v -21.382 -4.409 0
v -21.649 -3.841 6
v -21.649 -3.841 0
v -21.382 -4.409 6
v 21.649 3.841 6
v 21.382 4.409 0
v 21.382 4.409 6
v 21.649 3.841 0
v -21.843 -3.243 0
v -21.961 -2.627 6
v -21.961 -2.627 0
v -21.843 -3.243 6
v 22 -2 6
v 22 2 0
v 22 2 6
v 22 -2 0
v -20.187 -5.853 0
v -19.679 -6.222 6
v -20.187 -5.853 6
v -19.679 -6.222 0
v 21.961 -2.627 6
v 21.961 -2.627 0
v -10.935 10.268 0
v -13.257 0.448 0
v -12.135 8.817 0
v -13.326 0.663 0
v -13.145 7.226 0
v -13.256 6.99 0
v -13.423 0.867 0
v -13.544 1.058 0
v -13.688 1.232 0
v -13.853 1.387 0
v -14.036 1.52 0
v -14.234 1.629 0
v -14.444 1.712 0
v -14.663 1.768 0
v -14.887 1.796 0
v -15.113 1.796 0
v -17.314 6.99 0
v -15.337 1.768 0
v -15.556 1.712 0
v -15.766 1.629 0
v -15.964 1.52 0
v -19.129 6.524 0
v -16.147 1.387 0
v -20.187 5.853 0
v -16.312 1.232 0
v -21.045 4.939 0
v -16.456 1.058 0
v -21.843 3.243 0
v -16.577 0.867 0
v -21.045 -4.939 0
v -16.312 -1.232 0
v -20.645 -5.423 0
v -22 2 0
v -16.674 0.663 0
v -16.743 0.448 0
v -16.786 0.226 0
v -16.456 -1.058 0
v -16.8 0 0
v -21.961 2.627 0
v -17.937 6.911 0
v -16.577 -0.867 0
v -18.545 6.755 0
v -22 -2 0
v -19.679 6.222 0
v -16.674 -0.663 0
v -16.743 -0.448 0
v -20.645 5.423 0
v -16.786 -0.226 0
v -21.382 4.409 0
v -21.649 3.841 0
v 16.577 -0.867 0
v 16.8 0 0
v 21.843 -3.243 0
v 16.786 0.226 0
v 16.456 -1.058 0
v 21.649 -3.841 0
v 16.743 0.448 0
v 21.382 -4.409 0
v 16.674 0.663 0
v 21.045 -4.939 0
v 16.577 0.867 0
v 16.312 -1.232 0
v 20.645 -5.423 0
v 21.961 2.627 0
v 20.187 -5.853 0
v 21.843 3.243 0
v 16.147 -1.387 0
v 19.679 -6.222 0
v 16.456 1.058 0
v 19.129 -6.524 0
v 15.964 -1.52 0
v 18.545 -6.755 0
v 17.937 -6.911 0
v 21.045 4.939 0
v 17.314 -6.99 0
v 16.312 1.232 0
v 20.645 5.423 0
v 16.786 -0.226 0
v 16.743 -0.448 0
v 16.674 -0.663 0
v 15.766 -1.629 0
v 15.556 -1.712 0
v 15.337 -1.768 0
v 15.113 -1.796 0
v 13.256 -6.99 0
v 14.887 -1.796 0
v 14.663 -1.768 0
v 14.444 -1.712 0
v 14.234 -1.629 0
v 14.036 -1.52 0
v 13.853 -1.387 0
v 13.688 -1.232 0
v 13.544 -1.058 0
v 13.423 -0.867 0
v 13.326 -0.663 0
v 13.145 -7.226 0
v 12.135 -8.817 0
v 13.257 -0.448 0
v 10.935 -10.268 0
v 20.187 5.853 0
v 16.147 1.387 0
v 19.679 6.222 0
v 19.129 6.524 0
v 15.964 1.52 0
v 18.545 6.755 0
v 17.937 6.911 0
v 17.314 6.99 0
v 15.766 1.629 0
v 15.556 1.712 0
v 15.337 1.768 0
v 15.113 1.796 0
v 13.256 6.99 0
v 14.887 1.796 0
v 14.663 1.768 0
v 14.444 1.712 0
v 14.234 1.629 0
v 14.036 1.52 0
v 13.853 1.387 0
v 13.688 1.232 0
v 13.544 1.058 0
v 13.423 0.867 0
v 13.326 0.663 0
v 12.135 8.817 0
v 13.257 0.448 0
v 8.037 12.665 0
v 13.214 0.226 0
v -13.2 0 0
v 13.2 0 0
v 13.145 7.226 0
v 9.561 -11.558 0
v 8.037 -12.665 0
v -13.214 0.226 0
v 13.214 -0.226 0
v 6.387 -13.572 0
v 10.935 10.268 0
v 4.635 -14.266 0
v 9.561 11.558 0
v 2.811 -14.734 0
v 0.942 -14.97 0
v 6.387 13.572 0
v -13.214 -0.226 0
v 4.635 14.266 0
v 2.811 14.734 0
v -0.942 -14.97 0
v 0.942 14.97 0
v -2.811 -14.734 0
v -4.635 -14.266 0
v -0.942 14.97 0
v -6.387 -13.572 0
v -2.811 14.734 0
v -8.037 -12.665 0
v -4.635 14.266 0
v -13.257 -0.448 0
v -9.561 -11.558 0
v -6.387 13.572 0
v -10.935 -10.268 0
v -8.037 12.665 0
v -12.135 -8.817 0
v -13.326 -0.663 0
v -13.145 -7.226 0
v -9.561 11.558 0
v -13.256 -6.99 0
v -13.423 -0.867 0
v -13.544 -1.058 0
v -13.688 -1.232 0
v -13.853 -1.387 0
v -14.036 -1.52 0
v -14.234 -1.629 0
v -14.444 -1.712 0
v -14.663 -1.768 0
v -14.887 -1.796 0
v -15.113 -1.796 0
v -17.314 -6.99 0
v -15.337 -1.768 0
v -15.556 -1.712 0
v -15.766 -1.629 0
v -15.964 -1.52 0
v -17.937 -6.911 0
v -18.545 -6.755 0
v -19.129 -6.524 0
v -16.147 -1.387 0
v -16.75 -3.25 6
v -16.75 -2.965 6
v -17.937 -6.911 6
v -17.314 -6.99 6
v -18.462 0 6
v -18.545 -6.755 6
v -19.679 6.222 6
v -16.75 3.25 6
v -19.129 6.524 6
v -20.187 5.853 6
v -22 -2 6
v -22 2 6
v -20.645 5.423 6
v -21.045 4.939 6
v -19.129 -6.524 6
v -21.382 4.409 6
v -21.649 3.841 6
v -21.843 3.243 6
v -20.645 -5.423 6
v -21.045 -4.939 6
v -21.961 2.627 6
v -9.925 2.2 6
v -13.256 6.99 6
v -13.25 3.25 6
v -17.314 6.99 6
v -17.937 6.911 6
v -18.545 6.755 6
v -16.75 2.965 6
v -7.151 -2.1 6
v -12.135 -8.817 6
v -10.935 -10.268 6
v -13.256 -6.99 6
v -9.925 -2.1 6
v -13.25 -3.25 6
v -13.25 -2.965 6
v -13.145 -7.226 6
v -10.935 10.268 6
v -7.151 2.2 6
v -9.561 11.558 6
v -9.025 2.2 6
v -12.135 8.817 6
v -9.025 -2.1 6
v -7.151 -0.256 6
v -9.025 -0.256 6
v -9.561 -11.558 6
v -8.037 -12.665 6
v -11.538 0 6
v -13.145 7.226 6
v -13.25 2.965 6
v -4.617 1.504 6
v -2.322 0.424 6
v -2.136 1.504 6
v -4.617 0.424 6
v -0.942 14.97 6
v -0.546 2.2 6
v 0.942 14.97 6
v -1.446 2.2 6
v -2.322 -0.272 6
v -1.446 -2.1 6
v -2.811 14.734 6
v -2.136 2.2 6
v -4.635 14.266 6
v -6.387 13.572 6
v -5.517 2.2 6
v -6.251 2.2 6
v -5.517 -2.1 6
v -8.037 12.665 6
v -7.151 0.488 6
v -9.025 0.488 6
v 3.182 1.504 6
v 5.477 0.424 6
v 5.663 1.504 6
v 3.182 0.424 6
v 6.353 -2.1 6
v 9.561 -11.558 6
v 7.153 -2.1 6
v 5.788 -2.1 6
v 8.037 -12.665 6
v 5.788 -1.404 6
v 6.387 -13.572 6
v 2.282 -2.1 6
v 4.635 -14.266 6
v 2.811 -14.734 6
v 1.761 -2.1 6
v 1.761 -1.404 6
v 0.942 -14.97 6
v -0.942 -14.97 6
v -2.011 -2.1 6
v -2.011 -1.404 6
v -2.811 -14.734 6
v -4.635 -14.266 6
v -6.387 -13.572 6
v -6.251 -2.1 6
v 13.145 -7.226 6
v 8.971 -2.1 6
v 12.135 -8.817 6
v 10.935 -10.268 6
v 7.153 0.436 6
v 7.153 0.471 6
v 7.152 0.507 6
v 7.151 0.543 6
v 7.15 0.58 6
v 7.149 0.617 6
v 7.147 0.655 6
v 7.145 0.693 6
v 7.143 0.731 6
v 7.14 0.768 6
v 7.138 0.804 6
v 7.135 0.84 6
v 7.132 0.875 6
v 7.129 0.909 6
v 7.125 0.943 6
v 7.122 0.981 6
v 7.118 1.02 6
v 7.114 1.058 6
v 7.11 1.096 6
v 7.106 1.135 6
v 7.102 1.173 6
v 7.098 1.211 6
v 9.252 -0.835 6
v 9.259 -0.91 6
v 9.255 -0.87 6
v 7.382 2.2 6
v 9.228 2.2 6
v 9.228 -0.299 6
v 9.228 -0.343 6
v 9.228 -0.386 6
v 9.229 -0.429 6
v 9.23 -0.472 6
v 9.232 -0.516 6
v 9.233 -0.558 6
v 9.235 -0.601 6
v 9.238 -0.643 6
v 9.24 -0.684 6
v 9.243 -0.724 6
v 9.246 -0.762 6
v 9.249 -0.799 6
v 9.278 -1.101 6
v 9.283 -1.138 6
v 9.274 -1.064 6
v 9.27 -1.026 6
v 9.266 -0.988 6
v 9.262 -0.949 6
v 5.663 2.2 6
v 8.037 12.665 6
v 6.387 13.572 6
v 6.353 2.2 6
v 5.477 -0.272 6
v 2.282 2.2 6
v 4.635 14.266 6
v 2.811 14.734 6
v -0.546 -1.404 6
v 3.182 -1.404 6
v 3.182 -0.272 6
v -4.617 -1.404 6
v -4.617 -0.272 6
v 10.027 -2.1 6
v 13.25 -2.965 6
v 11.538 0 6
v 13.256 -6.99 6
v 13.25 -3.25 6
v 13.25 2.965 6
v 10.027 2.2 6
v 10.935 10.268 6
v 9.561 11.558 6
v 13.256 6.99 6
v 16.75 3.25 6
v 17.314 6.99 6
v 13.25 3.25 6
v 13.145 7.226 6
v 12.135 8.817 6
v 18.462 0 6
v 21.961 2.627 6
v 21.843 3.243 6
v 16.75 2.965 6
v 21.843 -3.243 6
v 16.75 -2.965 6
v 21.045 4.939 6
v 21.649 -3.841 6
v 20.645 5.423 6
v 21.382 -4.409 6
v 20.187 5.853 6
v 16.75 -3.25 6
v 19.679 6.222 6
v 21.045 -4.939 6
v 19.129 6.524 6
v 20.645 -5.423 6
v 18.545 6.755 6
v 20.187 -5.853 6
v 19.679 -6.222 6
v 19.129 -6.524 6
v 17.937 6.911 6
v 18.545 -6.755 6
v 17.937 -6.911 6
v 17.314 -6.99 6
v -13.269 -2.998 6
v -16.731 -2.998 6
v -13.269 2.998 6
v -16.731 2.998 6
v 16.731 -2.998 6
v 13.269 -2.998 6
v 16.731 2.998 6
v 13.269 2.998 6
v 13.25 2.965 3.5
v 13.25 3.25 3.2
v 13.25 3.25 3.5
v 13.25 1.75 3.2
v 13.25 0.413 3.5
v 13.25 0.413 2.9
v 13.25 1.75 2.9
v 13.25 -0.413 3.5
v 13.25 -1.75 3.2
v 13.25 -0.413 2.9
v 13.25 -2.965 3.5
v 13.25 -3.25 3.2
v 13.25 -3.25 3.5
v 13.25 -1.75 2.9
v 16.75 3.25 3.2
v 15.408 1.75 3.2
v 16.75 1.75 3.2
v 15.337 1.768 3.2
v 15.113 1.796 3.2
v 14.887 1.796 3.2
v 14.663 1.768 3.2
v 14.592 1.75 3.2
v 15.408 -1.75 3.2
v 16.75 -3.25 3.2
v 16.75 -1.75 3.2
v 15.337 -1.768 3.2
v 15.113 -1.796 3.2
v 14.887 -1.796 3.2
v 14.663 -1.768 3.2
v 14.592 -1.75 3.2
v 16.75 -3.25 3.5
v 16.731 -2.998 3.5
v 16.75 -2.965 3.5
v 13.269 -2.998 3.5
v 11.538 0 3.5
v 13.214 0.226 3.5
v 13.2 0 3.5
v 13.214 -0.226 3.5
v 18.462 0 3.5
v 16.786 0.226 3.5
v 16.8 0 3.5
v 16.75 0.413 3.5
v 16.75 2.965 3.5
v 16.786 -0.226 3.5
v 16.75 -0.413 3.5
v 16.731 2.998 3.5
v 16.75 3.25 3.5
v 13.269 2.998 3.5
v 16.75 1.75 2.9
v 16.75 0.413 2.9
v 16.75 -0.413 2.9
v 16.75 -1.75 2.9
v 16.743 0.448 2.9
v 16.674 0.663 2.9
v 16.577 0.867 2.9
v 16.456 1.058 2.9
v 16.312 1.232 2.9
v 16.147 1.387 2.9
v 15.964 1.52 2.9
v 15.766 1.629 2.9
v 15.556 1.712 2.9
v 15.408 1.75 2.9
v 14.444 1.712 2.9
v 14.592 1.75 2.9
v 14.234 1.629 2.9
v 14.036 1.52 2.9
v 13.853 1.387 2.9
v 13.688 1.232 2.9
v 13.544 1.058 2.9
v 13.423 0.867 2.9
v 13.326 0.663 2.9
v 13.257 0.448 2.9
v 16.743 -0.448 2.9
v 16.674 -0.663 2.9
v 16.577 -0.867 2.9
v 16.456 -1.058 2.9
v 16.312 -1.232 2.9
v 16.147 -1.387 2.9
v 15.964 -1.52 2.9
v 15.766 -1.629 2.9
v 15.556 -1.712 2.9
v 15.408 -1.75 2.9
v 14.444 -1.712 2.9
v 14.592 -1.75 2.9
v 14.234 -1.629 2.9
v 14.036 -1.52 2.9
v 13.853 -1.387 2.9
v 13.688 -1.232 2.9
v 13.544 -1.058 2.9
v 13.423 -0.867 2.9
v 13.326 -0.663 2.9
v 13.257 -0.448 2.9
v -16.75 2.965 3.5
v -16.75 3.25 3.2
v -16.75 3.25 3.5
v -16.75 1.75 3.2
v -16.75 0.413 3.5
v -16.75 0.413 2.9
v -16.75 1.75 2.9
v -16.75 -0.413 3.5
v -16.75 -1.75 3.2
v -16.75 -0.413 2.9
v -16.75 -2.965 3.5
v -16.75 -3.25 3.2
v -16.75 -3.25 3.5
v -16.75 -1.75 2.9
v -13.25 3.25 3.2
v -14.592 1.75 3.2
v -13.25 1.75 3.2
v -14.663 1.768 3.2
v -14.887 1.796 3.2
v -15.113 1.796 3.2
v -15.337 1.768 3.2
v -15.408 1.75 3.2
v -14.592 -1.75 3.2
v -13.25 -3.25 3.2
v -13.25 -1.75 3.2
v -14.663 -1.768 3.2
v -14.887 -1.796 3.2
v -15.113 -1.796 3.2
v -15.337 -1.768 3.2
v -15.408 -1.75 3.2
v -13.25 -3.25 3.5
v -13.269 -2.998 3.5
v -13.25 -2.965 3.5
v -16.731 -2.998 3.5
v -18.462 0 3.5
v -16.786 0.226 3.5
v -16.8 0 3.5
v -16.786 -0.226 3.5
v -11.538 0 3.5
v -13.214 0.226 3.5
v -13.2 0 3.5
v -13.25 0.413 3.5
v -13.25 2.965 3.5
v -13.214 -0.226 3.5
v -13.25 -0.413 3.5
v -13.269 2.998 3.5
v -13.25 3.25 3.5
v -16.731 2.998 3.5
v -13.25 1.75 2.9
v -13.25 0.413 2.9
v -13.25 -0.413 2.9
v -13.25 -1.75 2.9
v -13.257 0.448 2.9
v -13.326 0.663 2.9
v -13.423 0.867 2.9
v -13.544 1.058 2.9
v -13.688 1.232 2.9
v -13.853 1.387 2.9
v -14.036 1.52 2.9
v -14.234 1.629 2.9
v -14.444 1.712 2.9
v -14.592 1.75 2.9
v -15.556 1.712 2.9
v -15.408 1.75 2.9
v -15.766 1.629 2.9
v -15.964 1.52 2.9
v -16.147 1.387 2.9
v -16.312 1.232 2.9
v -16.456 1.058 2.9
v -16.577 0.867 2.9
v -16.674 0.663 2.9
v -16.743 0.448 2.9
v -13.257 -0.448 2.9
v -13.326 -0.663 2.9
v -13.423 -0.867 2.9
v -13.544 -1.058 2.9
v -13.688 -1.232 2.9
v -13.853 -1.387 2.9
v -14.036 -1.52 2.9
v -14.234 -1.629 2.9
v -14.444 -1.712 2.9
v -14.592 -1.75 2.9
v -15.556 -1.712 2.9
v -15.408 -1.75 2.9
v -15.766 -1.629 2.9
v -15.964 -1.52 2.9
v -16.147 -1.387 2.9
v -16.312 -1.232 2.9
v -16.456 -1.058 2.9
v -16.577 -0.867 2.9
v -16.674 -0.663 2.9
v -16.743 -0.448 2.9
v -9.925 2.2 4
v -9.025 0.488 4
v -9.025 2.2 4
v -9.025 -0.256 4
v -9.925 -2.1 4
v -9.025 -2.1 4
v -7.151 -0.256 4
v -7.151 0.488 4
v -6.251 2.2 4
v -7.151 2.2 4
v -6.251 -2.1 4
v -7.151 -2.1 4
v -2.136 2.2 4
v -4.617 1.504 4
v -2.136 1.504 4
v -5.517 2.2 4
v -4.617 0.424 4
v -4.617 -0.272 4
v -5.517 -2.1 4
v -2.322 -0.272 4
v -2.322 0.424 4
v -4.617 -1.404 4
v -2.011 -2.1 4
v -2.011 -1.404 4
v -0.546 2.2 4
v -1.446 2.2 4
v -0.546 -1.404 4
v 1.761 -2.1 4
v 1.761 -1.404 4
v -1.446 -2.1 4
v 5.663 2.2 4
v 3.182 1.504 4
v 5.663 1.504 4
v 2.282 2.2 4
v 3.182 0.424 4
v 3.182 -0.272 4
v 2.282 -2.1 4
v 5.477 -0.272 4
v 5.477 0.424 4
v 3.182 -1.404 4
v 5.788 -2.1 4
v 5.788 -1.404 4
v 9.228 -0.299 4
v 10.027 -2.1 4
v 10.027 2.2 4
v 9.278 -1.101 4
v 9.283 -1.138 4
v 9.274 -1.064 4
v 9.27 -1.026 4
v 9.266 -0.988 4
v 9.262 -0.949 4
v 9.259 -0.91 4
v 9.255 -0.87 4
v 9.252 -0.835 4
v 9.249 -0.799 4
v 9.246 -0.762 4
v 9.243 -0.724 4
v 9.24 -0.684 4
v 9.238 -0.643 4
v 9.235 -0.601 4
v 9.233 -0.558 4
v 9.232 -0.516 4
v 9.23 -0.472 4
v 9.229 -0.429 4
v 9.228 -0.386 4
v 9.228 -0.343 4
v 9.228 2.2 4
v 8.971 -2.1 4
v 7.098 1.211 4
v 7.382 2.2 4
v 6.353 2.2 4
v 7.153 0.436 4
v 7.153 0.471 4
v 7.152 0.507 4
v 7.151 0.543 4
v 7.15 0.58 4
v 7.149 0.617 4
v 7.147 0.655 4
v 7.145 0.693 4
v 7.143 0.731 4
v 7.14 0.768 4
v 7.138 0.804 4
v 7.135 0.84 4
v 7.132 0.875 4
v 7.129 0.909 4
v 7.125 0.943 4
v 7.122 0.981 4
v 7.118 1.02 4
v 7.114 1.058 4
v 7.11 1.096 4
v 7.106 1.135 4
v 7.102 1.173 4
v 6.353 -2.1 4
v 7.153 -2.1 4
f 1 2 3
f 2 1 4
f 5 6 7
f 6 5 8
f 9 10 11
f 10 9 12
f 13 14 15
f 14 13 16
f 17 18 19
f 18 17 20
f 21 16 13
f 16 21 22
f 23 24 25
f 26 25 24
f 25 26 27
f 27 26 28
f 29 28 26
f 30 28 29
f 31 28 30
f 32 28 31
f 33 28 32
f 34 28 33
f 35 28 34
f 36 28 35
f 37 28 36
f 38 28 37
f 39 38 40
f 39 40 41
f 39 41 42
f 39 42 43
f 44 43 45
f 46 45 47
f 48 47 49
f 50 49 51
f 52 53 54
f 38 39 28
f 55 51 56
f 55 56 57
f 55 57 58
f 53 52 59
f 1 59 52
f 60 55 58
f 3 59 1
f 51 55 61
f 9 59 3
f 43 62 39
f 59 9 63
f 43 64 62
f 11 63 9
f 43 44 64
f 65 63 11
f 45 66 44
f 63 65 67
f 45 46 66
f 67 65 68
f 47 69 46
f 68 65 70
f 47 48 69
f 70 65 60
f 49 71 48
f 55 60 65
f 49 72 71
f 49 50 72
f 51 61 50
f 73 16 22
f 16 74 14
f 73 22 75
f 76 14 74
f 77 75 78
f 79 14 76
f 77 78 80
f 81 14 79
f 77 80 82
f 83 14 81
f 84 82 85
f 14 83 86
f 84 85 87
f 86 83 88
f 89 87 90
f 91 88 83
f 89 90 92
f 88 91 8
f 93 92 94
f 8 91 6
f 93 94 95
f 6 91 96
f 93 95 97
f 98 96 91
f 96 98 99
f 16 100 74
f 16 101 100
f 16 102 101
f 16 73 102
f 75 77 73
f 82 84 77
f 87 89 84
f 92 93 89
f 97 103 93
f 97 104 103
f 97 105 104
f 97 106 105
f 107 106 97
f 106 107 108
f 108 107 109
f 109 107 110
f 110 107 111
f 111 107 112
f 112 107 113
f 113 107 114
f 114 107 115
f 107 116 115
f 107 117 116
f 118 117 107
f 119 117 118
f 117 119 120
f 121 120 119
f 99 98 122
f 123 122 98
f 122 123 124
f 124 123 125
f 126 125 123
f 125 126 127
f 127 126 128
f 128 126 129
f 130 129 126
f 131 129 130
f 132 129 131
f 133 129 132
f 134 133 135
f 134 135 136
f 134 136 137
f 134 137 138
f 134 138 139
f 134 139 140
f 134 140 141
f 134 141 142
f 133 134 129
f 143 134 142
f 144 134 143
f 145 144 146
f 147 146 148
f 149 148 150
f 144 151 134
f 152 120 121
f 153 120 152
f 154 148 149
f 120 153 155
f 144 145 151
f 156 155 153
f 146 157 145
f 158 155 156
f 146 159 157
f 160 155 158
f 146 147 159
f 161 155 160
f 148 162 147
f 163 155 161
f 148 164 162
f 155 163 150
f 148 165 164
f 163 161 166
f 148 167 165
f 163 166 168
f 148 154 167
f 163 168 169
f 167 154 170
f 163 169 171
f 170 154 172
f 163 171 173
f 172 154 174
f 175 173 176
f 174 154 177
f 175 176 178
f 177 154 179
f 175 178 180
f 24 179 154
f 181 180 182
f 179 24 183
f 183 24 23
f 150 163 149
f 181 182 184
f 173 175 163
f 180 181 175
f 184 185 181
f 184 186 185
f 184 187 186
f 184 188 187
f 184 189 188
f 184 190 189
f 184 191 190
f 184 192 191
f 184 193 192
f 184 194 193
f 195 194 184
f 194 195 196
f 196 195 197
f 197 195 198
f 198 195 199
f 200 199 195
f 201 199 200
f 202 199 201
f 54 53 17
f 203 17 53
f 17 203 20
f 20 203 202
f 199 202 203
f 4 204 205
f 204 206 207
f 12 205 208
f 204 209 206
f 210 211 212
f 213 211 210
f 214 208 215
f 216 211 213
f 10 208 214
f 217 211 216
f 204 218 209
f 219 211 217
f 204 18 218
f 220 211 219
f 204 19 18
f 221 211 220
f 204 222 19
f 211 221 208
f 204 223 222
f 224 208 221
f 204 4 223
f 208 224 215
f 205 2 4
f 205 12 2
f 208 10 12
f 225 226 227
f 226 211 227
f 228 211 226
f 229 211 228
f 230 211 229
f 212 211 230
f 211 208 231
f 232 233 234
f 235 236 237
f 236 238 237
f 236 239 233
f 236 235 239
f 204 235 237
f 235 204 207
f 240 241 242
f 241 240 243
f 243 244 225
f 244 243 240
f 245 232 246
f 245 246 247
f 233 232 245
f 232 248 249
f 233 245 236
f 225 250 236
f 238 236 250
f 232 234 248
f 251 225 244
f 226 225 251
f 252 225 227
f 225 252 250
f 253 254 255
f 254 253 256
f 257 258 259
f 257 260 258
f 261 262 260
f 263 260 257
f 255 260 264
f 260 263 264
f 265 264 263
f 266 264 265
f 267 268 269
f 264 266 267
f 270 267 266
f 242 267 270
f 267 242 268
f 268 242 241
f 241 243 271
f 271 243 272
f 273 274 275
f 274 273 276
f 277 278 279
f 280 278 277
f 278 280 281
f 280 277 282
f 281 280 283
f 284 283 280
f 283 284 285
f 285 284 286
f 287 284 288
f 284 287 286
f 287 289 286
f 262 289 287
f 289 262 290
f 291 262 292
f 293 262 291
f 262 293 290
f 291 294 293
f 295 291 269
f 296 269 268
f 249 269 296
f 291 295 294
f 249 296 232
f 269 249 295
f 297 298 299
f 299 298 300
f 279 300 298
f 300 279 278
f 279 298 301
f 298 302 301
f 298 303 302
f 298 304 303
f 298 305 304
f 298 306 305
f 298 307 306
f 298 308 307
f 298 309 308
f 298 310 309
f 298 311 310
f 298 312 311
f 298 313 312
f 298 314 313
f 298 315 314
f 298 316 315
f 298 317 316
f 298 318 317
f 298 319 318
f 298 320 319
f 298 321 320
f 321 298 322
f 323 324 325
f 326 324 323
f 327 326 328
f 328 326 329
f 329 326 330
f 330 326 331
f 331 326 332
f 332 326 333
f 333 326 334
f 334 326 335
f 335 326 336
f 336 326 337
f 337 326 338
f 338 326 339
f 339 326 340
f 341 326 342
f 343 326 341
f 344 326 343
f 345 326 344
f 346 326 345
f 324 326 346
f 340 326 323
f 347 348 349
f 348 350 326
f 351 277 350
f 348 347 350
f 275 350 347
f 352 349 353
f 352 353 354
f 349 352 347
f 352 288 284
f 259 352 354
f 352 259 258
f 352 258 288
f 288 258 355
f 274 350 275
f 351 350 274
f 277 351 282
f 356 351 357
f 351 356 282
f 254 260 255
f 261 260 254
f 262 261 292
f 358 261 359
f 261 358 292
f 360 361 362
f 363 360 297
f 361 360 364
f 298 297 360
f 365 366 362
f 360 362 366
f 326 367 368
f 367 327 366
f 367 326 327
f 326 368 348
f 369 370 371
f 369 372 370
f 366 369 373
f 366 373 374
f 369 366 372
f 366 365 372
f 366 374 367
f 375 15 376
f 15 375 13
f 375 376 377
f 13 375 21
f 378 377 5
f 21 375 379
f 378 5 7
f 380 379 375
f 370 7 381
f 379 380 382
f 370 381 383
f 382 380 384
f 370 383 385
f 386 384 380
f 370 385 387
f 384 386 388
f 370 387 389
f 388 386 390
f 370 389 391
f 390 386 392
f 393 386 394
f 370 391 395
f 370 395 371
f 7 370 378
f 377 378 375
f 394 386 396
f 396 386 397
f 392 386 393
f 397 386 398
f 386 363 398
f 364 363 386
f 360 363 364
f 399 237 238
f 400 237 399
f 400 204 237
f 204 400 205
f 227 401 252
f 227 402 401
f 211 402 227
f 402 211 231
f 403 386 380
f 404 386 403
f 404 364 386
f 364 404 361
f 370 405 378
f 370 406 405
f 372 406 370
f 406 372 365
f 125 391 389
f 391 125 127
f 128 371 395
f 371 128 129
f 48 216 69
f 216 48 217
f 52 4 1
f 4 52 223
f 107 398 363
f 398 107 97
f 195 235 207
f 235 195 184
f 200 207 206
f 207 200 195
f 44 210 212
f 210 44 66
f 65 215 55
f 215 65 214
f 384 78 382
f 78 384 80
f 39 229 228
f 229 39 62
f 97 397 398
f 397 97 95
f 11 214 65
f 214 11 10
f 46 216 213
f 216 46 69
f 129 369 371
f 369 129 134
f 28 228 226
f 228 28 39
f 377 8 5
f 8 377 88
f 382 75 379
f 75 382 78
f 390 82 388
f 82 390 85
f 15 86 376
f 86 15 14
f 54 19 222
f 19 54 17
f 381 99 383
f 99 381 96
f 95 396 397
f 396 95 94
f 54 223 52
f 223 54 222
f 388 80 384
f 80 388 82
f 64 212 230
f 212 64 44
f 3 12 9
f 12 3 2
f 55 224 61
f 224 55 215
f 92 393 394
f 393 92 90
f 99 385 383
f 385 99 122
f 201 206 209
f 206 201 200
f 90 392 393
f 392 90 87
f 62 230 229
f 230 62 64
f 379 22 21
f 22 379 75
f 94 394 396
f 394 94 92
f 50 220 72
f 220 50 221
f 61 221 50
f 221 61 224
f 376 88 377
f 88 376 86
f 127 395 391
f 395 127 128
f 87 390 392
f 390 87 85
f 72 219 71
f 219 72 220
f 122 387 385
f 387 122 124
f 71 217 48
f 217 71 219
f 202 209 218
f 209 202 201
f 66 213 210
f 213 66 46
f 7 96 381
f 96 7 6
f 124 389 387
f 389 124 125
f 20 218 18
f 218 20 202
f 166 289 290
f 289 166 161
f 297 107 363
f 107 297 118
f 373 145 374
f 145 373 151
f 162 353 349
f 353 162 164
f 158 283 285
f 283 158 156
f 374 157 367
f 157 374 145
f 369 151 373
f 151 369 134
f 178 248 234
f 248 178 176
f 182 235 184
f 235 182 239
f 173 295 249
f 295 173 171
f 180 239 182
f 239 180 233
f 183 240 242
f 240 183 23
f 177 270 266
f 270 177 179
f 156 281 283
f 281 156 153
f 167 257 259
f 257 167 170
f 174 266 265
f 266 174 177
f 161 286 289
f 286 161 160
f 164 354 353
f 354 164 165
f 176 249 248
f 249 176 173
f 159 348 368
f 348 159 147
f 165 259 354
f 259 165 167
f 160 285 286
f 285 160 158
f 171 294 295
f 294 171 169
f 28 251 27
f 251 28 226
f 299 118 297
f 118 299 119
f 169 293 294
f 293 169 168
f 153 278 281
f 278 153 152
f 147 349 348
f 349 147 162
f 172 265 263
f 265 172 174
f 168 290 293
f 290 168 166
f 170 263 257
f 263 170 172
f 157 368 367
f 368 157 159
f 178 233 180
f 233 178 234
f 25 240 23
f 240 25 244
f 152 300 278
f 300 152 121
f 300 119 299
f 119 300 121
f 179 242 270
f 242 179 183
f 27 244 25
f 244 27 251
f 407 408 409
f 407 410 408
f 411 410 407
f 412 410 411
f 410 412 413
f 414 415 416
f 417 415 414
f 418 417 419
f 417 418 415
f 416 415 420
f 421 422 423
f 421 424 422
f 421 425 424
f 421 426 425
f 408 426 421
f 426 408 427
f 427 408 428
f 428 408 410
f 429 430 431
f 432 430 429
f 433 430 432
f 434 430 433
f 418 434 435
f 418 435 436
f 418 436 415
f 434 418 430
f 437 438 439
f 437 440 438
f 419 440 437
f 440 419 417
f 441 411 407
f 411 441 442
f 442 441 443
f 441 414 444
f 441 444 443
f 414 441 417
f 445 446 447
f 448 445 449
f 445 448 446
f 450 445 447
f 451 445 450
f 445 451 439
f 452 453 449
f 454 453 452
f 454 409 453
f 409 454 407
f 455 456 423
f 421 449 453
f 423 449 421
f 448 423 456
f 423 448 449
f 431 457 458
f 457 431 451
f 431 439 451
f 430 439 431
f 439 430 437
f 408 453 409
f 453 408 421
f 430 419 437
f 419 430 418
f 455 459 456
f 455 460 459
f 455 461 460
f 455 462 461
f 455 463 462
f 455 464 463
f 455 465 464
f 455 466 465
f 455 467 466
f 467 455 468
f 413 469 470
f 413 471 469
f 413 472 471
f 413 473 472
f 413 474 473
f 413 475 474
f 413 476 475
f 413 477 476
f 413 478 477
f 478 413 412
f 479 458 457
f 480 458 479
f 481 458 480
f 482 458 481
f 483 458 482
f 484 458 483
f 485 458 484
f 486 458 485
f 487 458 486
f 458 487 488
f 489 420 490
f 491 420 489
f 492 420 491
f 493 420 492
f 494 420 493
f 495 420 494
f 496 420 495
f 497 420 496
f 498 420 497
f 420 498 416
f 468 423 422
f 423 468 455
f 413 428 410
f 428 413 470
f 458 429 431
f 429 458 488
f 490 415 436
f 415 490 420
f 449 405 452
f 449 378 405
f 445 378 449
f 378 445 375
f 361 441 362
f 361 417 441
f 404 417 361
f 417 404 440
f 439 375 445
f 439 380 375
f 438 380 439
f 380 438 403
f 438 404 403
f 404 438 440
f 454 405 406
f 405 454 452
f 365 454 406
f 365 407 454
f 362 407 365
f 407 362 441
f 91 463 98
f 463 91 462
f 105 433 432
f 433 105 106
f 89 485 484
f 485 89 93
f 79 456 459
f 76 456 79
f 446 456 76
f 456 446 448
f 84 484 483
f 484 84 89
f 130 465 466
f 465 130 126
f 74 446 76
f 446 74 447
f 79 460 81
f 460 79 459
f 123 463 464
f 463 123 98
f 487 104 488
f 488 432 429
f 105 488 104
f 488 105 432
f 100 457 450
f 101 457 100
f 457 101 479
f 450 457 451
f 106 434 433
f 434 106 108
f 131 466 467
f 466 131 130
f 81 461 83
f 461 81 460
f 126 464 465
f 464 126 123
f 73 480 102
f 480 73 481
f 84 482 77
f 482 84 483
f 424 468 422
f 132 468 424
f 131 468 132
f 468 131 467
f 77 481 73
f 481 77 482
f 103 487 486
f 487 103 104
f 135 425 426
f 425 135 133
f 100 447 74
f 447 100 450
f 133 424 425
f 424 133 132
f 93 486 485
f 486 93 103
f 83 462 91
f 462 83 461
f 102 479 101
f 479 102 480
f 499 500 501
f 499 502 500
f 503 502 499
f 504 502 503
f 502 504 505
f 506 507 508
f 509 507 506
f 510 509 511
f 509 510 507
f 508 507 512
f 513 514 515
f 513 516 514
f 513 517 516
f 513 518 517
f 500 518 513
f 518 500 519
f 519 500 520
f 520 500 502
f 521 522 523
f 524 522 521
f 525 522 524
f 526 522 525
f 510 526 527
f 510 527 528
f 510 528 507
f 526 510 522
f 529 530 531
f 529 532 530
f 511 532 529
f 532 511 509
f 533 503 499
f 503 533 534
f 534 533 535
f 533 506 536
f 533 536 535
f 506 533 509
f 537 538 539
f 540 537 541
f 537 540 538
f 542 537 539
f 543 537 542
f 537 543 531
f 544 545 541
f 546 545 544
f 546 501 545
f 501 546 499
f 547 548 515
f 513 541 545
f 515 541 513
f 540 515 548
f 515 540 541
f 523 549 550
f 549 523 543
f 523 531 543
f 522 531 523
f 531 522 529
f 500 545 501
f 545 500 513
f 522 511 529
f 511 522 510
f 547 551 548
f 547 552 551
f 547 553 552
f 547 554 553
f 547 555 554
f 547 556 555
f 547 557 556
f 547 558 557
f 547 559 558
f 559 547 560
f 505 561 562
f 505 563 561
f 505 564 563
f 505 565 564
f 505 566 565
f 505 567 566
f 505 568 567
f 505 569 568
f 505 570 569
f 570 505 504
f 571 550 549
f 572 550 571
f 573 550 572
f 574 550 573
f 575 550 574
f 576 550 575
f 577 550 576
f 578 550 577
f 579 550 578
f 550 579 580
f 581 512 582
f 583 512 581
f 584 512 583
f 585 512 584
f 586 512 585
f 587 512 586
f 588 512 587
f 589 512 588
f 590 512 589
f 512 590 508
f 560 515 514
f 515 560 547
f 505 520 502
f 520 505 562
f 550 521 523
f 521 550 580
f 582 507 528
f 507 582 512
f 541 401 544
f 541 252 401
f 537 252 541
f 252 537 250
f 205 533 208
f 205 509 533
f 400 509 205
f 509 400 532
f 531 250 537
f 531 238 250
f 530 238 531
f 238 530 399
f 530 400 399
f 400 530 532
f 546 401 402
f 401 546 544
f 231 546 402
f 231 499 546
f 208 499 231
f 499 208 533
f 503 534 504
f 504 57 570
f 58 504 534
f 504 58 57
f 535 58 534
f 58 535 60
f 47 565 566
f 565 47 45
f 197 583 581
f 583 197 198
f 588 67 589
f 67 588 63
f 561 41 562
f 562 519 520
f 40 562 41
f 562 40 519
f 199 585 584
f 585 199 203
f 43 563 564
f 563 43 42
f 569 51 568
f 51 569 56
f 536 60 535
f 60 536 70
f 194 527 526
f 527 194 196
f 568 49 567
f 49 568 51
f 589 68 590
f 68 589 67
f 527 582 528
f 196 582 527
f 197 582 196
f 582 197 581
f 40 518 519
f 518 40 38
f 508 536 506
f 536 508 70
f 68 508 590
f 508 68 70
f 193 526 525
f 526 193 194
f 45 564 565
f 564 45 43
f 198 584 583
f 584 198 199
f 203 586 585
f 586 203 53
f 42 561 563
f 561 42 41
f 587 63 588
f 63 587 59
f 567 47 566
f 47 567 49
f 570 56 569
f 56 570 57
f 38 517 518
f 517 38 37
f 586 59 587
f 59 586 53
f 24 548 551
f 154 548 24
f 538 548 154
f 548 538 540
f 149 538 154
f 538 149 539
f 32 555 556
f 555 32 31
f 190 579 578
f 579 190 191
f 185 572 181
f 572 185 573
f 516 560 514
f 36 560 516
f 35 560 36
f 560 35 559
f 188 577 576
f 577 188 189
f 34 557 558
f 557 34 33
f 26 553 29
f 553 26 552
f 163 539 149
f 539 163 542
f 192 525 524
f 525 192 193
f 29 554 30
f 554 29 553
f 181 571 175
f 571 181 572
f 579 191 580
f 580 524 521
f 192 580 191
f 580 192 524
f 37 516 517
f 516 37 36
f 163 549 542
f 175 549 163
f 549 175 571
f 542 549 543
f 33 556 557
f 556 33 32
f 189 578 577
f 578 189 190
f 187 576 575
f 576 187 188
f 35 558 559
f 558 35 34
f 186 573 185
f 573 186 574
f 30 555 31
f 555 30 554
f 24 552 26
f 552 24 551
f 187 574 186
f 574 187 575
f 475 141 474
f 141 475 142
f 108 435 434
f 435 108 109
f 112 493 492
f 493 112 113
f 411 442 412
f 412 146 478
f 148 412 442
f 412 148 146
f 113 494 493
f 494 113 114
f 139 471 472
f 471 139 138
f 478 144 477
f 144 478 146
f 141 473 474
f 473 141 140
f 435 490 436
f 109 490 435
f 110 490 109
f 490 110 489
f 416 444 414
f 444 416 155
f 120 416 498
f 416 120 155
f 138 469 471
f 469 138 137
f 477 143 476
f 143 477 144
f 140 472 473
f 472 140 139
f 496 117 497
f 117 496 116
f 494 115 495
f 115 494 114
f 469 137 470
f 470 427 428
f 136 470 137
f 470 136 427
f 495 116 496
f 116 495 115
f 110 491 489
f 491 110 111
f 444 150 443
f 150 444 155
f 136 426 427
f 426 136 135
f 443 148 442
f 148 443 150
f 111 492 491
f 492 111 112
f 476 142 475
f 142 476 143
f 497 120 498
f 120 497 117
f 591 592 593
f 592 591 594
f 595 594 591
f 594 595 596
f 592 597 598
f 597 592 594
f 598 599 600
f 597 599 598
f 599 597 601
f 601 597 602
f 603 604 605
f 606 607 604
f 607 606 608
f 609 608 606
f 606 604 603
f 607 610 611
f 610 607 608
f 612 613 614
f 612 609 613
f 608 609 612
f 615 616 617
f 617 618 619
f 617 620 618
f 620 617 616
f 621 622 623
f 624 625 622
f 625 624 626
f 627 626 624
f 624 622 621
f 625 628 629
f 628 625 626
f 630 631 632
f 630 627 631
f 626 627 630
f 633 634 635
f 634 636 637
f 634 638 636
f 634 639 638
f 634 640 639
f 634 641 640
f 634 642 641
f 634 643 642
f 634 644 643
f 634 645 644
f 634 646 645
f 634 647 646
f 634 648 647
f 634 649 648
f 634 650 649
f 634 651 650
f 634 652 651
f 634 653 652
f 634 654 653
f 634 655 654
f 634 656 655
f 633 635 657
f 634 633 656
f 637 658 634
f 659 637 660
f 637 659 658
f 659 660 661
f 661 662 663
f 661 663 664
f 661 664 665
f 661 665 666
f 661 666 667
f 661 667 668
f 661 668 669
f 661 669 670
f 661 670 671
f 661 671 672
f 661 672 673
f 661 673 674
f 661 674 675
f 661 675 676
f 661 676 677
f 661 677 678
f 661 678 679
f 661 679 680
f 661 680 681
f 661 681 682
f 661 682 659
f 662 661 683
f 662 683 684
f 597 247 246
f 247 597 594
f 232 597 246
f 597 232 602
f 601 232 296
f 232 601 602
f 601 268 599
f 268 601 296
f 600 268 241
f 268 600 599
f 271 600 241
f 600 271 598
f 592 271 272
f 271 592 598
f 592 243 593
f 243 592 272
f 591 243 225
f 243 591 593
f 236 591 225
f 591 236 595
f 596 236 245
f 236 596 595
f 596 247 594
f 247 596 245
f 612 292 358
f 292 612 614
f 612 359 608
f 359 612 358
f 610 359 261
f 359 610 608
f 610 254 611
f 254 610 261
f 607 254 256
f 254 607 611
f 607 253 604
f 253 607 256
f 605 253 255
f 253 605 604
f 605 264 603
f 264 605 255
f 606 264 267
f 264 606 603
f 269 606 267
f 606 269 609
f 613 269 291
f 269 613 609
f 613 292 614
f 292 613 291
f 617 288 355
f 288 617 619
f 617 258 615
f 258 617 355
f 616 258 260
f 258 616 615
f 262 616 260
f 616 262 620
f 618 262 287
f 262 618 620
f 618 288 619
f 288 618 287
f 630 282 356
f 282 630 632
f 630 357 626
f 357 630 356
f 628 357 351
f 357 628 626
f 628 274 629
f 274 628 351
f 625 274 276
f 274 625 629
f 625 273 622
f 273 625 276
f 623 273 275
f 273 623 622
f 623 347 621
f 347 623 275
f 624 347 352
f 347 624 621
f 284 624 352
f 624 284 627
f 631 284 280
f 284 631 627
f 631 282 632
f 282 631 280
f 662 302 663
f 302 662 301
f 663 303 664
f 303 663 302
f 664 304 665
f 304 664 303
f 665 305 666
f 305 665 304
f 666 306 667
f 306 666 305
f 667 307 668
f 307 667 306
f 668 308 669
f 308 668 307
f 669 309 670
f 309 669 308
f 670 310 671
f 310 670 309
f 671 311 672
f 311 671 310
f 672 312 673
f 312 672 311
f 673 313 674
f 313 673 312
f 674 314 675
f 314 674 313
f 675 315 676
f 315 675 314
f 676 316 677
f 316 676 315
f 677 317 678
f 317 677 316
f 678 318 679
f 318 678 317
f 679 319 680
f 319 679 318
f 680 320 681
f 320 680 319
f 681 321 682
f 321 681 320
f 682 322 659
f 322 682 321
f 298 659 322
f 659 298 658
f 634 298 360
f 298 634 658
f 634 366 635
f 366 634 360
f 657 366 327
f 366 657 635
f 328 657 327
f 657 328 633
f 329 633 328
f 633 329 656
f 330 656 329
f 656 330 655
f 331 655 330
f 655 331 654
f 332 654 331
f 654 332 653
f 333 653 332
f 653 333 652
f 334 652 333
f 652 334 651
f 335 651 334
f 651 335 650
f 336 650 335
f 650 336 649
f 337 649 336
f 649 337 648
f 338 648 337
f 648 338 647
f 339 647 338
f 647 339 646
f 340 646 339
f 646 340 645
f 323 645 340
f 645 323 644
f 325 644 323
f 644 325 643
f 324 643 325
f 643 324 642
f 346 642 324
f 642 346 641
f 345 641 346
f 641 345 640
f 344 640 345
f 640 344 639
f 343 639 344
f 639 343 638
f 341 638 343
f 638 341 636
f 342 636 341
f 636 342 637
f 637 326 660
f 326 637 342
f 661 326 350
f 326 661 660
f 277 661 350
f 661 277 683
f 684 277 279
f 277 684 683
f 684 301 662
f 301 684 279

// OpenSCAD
$fn = 50;


difference() {
	union() {
		hull() {
			translate(v = [-17.0000000000, 2.0000000000, 0]) {
				cylinder(h = 6, r = 5);
			}
			translate(v = [17.0000000000, 2.0000000000, 0]) {
				cylinder(h = 6, r = 5);
			}
			translate(v = [-17.0000000000, -2.0000000000, 0]) {
				cylinder(h = 6, r = 5);
			}
			translate(v = [17.0000000000, -2.0000000000, 0]) {
				cylinder(h = 6, r = 5);
			}
		}
		cylinder(h = 6, r = 15.0000000000);
	}
	union() {
		translate(v = [15.0000000000, 0, -20]) {
			rotate(a = [0, 180, 0]) {
				difference() {
					union() {
						translate(v = [0, 0, -26.0000000000]) {
							rotate(a = [0, 0, 0]) {
								difference() {
									union() {
										#translate(v = [-1.7500000000, -3.2500000000, -0.3000000000]) {
											cube(size = [3.5000000000, 6.5000000000, 0.3000000000]);
										}
										#translate(v = [-1.7500000000, -1.7500000000, -0.6000000000]) {
											cube(size = [3.5000000000, 3.5000000000, 0.3000000000]);
										}
										#translate(v = [-1.7500000000, -3.2500000000, 2.5000000000]) {
											cube(size = [3.5000000000, 6.5000000000, 0.3000000000]);
										}
										#translate(v = [-1.7500000000, -1.7500000000, 2.8000000000]) {
											cube(size = [3.5000000000, 3.5000000000, 0.3000000000]);
										}
										#linear_extrude(height = 2.5000000000) {
											polygon(points = [[3.4620000000, 0.0000000000], [1.7310000000, 2.9981799479], [-1.7310000000, 2.9981799479], [-3.4620000000, 0.0000000000], [-1.7310000000, -2.9981799479], [1.7310000000, -2.9981799479]]);
										}
										#translate(v = [-1.7500000000, -3.2500000000, -0.3000000000]) {
											cube(size = [3.5000000000, 6.5000000000, 0.3000000000]);
										}
										#translate(v = [-1.7500000000, -1.7500000000, -0.6000000000]) {
											cube(size = [3.5000000000, 3.5000000000, 0.3000000000]);
										}
										#translate(v = [-1.7500000000, -3.2500000000, 2.5000000000]) {
											cube(size = [3.5000000000, 6.5000000000, 0.3000000000]);
										}
										#translate(v = [-1.7500000000, -1.7500000000, 2.8000000000]) {
											cube(size = [3.5000000000, 3.5000000000, 0.3000000000]);
										}
										#translate(v = [-1.7500000000, -3.2500000000, -0.3000000000]) {
											cube(size = [3.5000000000, 6.5000000000, 0.3000000000]);
										}
										#translate(v = [-1.7500000000, -1.7500000000, -0.6000000000]) {
											cube(size = [3.5000000000, 3.5000000000, 0.3000000000]);
										}
										#translate(v = [-1.7500000000, -3.2500000000, 2.5000000000]) {
											cube(size = [3.5000000000, 6.5000000000, 0.3000000000]);
										}
										#translate(v = [-1.7500000000, -1.7500000000, 2.8000000000]) {
											cube(size = [3.5000000000, 3.5000000000, 0.3000000000]);
										}
									}
									union();
								}
							}
						}
						translate(v = [0, 0, -26.0000000000]) {
							rotate(a = [0, 0, 0]) {
								difference() {
									union() {
										#translate(v = [-1.7500000000, -3.2500000000, -0.3000000000]) {
											cube(size = [3.5000000000, 6.5000000000, 0.3000000000]);
										}
										#translate(v = [-1.7500000000, -1.7500000000, -0.6000000000]) {
											cube(size = [3.5000000000, 3.5000000000, 0.3000000000]);
										}
										#translate(v = [-1.7500000000, -3.2500000000, 2.5000000000]) {
											cube(size = [3.5000000000, 6.5000000000, 0.3000000000]);
										}
										#translate(v = [-1.7500000000, -1.7500000000, 2.8000000000]) {
											cube(size = [3.5000000000, 3.5000000000, 0.3000000000]);
										}
										#linear_extrude(height = 2.5000000000) {
											polygon(points = [[3.4620000000, 0.0000000000], [1.7310000000, 2.9981799479], [-1.7310000000, 2.9981799479], [-3.4620000000, 0.0000000000], [-1.7310000000, -2.9981799479], [1.7310000000, -2.9981799479]]);
										}
										#translate(v = [-1.7500000000, -3.2500000000, -0.3000000000]) {
											cube(size = [3.5000000000, 6.5000000000, 0.3000000000]);
										}
										#translate(v = [-1.7500000000, -1.7500000000, -0.6000000000]) {
											cube(size = [3.5000000000, 3.5000000000, 0.3000000000]);
										}
										#translate(v = [-1.7500000000, -3.2500000000, 2.5000000000]) {
											cube(size = [3.5000000000, 6.5000000000, 0.3000000000]);
										}
										#translate(v = [-1.7500000000, -1.7500000000, 2.8000000000]) {
											cube(size = [3.5000000000, 3.5000000000, 0.3000000000]);
										}
										#translate(v = [-1.7500000000, -3.2500000000, -0.3000000000]) {
											cube(size = [3.5000000000, 6.5000000000, 0.3000000000]);
										}
										#translate(v = [-1.7500000000, -1.7500000000, -0.6000000000]) {
											cube(size = [3.5000000000, 3.5000000000, 0.3000000000]);
										}
										#translate(v = [-1.7500000000, -3.2500000000, 2.5000000000]) {
											cube(size = [3.5000000000, 6.5000000000, 0.3000000000]);
										}
										#translate(v = [-1.7500000000, -1.7500000000, 2.8000000000]) {
											cube(size = [3.5000000000, 3.5000000000, 0.3000000000]);
										}
									}
									union();
								}
							}
						}
						translate(v = [0, 0, -26.0000000000]) {
							rotate(a = [0, 0, 0]) {
								difference() {
									union() {
										#translate(v = [-1.7500000000, -3.2500000000, -0.3000000000]) {
											cube(size = [3.5000000000, 6.5000000000, 0.3000000000]);
										}
										#translate(v = [-1.7500000000, -1.7500000000, -0.6000000000]) {
											cube(size = [3.5000000000, 3.5000000000, 0.3000000000]);
										}
										#translate(v = [-1.7500000000, -3.2500000000, 2.5000000000]) {
											cube(size = [3.5000000000, 6.5000000000, 0.3000000000]);
										}
										#translate(v = [-1.7500000000, -1.7500000000, 2.8000000000]) {
											cube(size = [3.5000000000, 3.5000000000, 0.3000000000]);
										}
										#linear_extrude(height = 2.5000000000) {
											polygon(points = [[3.4620000000, 0.0000000000], [1.7310000000, 2.9981799479], [-1.7310000000, 2.9981799479], [-3.4620000000, 0.0000000000], [-1.7310000000, -2.9981799479], [1.7310000000, -2.9981799479]]);
										}
										#translate(v = [-1.7500000000, -3.2500000000, -0.3000000000]) {
											cube(size = [3.5000000000, 6.5000000000, 0.3000000000]);
										}
										#translate(v = [-1.7500000000, -1.7500000000, -0.6000000000]) {
											cube(size = [3.5000000000, 3.5000000000, 0.3000000000]);
										}
										#translate(v = [-1.7500000000, -3.2500000000, 2.5000000000]) {
											cube(size = [3.5000000000, 6.5000000000, 0.3000000000]);
										}
										#translate(v = [-1.7500000000, -1.7500000000, 2.8000000000]) {
											cube(size = [3.5000000000, 3.5000000000, 0.3000000000]);
										}
										#translate(v = [-1.7500000000, -3.2500000000, -0.3000000000]) {
											cube(size = [3.5000000000, 6.5000000000, 0.3000000000]);
										}
										#translate(v = [-1.7500000000, -1.7500000000, -0.6000000000]) {
											cube(size = [3.5000000000, 3.5000000000, 0.3000000000]);
										}
										#translate(v = [-1.7500000000, -3.2500000000, 2.5000000000]) {
											cube(size = [3.5000000000, 6.5000000000, 0.3000000000]);
										}
										#translate(v = [-1.7500000000, -1.7500000000, 2.8000000000]) {
											cube(size = [3.5000000000, 3.5000000000, 0.3000000000]);
										}
									}
									union();
								}
							}
						}
						#translate(v = [0, 0, -26.0000000000]) {
							cylinder(h = 26, r = 1.5000000000);
						}
						#translate(v = [0, 0, -1.9000000000]) {
							cylinder(h = 1.9000000000, r1 = 1.8000000000, r2 = 3.6000000000);
						}
						#translate(v = [0, 0, -26.0000000000]) {
							cylinder(h = 26, r = 1.8000000000);
						}
						#translate(v = [0, 0, -26.0000000000]) {
							cylinder(h = 26, r = 1.5000000000);
						}
					}
					union();
				}
			}
		}
		translate(v = [-15.0000000000, 0, -20]) {
			rotate(a = [0, 180, 0]) {
				difference() {
					union() {
						translate(v = [0, 0, -26.0000000000]) {
							rotate(a = [0, 0, 0]) {
								difference() {
									union() {
										#translate(v = [-1.7500000000, -3.2500000000, -0.3000000000]) {
											cube(size = [3.5000000000, 6.5000000000, 0.3000000000]);
										}
										#translate(v = [-1.7500000000, -1.7500000000, -0.6000000000]) {
											cube(size = [3.5000000000, 3.5000000000, 0.3000000000]);
										}
										#translate(v = [-1.7500000000, -3.2500000000, 2.5000000000]) {
											cube(size = [3.5000000000, 6.5000000000, 0.3000000000]);
										}
										#translate(v = [-1.7500000000, -1.7500000000, 2.8000000000]) {
											cube(size = [3.5000000000, 3.5000000000, 0.3000000000]);
										}
										#linear_extrude(height = 2.5000000000) {
											polygon(points = [[3.4620000000, 0.0000000000], [1.7310000000, 2.9981799479], [-1.7310000000, 2.9981799479], [-3.4620000000, 0.0000000000], [-1.7310000000, -2.9981799479], [1.7310000000, -2.9981799479]]);
										}
										#translate(v = [-1.7500000000, -3.2500000000, -0.3000000000]) {
											cube(size = [3.5000000000, 6.5000000000, 0.3000000000]);
										}
										#translate(v = [-1.7500000000, -1.7500000000, -0.6000000000]) {
											cube(size = [3.5000000000, 3.5000000000, 0.3000000000]);
										}
										#translate(v = [-1.7500000000, -3.2500000000, 2.5000000000]) {
											cube(size = [3.5000000000, 6.5000000000, 0.3000000000]);
										}
										#translate(v = [-1.7500000000, -1.7500000000, 2.8000000000]) {
											cube(size = [3.5000000000, 3.5000000000, 0.3000000000]);
										}
										#translate(v = [-1.7500000000, -3.2500000000, -0.3000000000]) {
											cube(size = [3.5000000000, 6.5000000000, 0.3000000000]);
										}
										#translate(v = [-1.7500000000, -1.7500000000, -0.6000000000]) {
											cube(size = [3.5000000000, 3.5000000000, 0.3000000000]);
										}
										#translate(v = [-1.7500000000, -3.2500000000, 2.5000000000]) {
											cube(size = [3.5000000000, 6.5000000000, 0.3000000000]);
										}
										#translate(v = [-1.7500000000, -1.7500000000, 2.8000000000]) {
											cube(size = [3.5000000000, 3.5000000000, 0.3000000000]);
										}
									}
									union();
								}
							}
						}
						translate(v = [0, 0, -26.0000000000]) {
							rotate(a = [0, 0, 0]) {
								difference() {
									union() {
										#translate(v = [-1.7500000000, -3.2500000000, -0.3000000000]) {
											cube(size = [3.5000000000, 6.5000000000, 0.3000000000]);
										}
										#translate(v = [-1.7500000000, -1.7500000000, -0.6000000000]) {
											cube(size = [3.5000000000, 3.5000000000, 0.3000000000]);
										}
										#translate(v = [-1.7500000000, -3.2500000000, 2.5000000000]) {
											cube(size = [3.5000000000, 6.5000000000, 0.3000000000]);
										}
										#translate(v = [-1.7500000000, -1.7500000000, 2.8000000000]) {
											cube(size = [3.5000000000, 3.5000000000, 0.3000000000]);
										}
										#linear_extrude(height = 2.5000000000) {
											polygon(points = [[3.4620000000, 0.0000000000], [1.7310000000, 2.9981799479], [-1.7310000000, 2.9981799479], [-3.4620000000, 0.0000000000], [-1.7310000000, -2.9981799479], [1.7310000000, -2.9981799479]]);
										}
										#translate(v = [-1.7500000000, -3.2500000000, -0.3000000000]) {
											cube(size = [3.5000000000, 6.5000000000, 0.3000000000]);
										}
										#translate(v = [-1.7500000000, -1.7500000000, -0.6000000000]) {
											cube(size = [3.5000000000, 3.5000000000, 0.3000000000]);
										}
										#translate(v = [-1.7500000000, -3.2500000000, 2.5000000000]) {
											cube(size = [3.5000000000, 6.5000000000, 0.3000000000]);
										}
										#translate(v = [-1.7500000000, -1.7500000000, 2.8000000000]) {
											cube(size = [3.5000000000, 3.5000000000, 0.3000000000]);
										}
										#translate(v = [-1.7500000000, -3.2500000000, -0.3000000000]) {
											cube(size = [3.5000000000, 6.5000000000, 0.3000000000]);
										}
										#translate(v = [-1.7500000000, -1.7500000000, -0.6000000000]) {
											cube(size = [3.5000000000, 3.5000000000, 0.3000000000]);
										}
										#translate(v = [-1.7500000000, -3.2500000000, 2.5000000000]) {
											cube(size = [3.5000000000, 6.5000000000, 0.3000000000]);
										}
										#translate(v = [-1.7500000000, -1.7500000000, 2.8000000000]) {
											cube(size = [3.5000000000, 3.5000000000, 0.3000000000]);
										}
									}
									union();
								}
							}
						}
						translate(v = [0, 0, -26.0000000000]) {
							rotate(a = [0, 0, 0]) {
								difference() {
									union() {
										#translate(v = [-1.7500000000, -3.2500000000, -0.3000000000]) {
											cube(size = [3.5000000000, 6.5000000000, 0.3000000000]);
										}
										#translate(v = [-1.7500000000, -1.7500000000, -0.6000000000]) {
											cube(size = [3.5000000000, 3.5000000000, 0.3000000000]);
										}
										#translate(v = [-1.7500000000, -3.2500000000, 2.5000000000]) {
											cube(size = [3.5000000000, 6.5000000000, 0.3000000000]);
										}
										#translate(v = [-1.7500000000, -1.7500000000, 2.8000000000]) {
											cube(size = [3.5000000000, 3.5000000000, 0.3000000000]);
										}
										#linear_extrude(height = 2.5000000000) {
											polygon(points = [[3.4620000000, 0.0000000000], [1.7310000000, 2.9981799479], [-1.7310000000, 2.9981799479], [-3.4620000000, 0.0000000000], [-1.7310000000, -2.9981799479], [1.7310000000, -2.9981799479]]);
										}
										#translate(v = [-1.7500000000, -3.2500000000, -0.3000000000]) {
											cube(size = [3.5000000000, 6.5000000000, 0.3000000000]);
										}
										#translate(v = [-1.7500000000, -1.7500000000, -0.6000000000]) {
											cube(size = [3.5000000000, 3.5000000000, 0.3000000000]);
										}
										#translate(v = [-1.7500000000, -3.2500000000, 2.5000000000]) {
											cube(size = [3.5000000000, 6.5000000000, 0.3000000000]);
										}
										#translate(v = [-1.7500000000, -1.7500000000, 2.8000000000]) {
											cube(size = [3.5000000000, 3.5000000000, 0.3000000000]);
										}
										#translate(v = [-1.7500000000, -3.2500000000, -0.3000000000]) {
											cube(size = [3.5000000000, 6.5000000000, 0.3000000000]);
										}
										#translate(v = [-1.7500000000, -1.7500000000, -0.6000000000]) {
											cube(size = [3.5000000000, 3.5000000000, 0.3000000000]);
										}
										#translate(v = [-1.7500000000, -3.2500000000, 2.5000000000]) {
											cube(size = [3.5000000000, 6.5000000000, 0.3000000000]);
										}
										#translate(v = [-1.7500000000, -1.7500000000, 2.8000000000]) {
											cube(size = [3.5000000000, 3.5000000000, 0.3000000000]);
										}
									}
									union();
								}
							}
						}
						#translate(v = [0, 0, -26.0000000000]) {
							cylinder(h = 26, r = 1.5000000000);
						}
						#translate(v = [0, 0, -1.9000000000]) {
							cylinder(h = 1.9000000000, r1 = 1.8000000000, r2 = 3.6000000000);
						}
						#translate(v = [0, 0, -26.0000000000]) {
							cylinder(h = 26, r = 1.8000000000);
						}
						#translate(v = [0, 0, -26.0000000000]) {
							cylinder(h = 26, r = 1.5000000000);
						}
					}
					union();
				}
			}
		}
		translate(v = [-15.0000000000, 0.0000000000, 0]) {
			cylinder(h = 6, r = 1.8000000000);
		}
		translate(v = [15.0000000000, 0.0000000000, 0]) {
			cylinder(h = 6, r = 1.8000000000);
		}
		translate(v = [-15.0000000000, 0.0000000000, 0]) {
			cylinder(h = 6, r = 1.8000000000);
		}
		translate(v = [15.0000000000, 0.0000000000, 0]) {
			cylinder(h = 6, r = 1.8000000000);
		}
		translate(v = [-15.0000000000, 0.0000000000, 0]) {
			cylinder(h = 6, r = 1.8000000000);
		}
		translate(v = [15.0000000000, 0.0000000000, 0]) {
			cylinder(h = 6, r = 1.8000000000);
		}
		translate(v = [-15.0000000000, 0.0000000000, 0]) {
			cylinder(h = 6, r = 1.8000000000);
		}
		translate(v = [15.0000000000, 0.0000000000, 0]) {
			cylinder(h = 6, r = 1.8000000000);
		}
		#translate(v = [0, 0, 4]) {
			linear_extrude(height = 2) {
				text(font = "Arial:Bold", halign = "center", size = 4.5000000000, text = "HELEN", valign = "center");
			}
		}
	}
}
